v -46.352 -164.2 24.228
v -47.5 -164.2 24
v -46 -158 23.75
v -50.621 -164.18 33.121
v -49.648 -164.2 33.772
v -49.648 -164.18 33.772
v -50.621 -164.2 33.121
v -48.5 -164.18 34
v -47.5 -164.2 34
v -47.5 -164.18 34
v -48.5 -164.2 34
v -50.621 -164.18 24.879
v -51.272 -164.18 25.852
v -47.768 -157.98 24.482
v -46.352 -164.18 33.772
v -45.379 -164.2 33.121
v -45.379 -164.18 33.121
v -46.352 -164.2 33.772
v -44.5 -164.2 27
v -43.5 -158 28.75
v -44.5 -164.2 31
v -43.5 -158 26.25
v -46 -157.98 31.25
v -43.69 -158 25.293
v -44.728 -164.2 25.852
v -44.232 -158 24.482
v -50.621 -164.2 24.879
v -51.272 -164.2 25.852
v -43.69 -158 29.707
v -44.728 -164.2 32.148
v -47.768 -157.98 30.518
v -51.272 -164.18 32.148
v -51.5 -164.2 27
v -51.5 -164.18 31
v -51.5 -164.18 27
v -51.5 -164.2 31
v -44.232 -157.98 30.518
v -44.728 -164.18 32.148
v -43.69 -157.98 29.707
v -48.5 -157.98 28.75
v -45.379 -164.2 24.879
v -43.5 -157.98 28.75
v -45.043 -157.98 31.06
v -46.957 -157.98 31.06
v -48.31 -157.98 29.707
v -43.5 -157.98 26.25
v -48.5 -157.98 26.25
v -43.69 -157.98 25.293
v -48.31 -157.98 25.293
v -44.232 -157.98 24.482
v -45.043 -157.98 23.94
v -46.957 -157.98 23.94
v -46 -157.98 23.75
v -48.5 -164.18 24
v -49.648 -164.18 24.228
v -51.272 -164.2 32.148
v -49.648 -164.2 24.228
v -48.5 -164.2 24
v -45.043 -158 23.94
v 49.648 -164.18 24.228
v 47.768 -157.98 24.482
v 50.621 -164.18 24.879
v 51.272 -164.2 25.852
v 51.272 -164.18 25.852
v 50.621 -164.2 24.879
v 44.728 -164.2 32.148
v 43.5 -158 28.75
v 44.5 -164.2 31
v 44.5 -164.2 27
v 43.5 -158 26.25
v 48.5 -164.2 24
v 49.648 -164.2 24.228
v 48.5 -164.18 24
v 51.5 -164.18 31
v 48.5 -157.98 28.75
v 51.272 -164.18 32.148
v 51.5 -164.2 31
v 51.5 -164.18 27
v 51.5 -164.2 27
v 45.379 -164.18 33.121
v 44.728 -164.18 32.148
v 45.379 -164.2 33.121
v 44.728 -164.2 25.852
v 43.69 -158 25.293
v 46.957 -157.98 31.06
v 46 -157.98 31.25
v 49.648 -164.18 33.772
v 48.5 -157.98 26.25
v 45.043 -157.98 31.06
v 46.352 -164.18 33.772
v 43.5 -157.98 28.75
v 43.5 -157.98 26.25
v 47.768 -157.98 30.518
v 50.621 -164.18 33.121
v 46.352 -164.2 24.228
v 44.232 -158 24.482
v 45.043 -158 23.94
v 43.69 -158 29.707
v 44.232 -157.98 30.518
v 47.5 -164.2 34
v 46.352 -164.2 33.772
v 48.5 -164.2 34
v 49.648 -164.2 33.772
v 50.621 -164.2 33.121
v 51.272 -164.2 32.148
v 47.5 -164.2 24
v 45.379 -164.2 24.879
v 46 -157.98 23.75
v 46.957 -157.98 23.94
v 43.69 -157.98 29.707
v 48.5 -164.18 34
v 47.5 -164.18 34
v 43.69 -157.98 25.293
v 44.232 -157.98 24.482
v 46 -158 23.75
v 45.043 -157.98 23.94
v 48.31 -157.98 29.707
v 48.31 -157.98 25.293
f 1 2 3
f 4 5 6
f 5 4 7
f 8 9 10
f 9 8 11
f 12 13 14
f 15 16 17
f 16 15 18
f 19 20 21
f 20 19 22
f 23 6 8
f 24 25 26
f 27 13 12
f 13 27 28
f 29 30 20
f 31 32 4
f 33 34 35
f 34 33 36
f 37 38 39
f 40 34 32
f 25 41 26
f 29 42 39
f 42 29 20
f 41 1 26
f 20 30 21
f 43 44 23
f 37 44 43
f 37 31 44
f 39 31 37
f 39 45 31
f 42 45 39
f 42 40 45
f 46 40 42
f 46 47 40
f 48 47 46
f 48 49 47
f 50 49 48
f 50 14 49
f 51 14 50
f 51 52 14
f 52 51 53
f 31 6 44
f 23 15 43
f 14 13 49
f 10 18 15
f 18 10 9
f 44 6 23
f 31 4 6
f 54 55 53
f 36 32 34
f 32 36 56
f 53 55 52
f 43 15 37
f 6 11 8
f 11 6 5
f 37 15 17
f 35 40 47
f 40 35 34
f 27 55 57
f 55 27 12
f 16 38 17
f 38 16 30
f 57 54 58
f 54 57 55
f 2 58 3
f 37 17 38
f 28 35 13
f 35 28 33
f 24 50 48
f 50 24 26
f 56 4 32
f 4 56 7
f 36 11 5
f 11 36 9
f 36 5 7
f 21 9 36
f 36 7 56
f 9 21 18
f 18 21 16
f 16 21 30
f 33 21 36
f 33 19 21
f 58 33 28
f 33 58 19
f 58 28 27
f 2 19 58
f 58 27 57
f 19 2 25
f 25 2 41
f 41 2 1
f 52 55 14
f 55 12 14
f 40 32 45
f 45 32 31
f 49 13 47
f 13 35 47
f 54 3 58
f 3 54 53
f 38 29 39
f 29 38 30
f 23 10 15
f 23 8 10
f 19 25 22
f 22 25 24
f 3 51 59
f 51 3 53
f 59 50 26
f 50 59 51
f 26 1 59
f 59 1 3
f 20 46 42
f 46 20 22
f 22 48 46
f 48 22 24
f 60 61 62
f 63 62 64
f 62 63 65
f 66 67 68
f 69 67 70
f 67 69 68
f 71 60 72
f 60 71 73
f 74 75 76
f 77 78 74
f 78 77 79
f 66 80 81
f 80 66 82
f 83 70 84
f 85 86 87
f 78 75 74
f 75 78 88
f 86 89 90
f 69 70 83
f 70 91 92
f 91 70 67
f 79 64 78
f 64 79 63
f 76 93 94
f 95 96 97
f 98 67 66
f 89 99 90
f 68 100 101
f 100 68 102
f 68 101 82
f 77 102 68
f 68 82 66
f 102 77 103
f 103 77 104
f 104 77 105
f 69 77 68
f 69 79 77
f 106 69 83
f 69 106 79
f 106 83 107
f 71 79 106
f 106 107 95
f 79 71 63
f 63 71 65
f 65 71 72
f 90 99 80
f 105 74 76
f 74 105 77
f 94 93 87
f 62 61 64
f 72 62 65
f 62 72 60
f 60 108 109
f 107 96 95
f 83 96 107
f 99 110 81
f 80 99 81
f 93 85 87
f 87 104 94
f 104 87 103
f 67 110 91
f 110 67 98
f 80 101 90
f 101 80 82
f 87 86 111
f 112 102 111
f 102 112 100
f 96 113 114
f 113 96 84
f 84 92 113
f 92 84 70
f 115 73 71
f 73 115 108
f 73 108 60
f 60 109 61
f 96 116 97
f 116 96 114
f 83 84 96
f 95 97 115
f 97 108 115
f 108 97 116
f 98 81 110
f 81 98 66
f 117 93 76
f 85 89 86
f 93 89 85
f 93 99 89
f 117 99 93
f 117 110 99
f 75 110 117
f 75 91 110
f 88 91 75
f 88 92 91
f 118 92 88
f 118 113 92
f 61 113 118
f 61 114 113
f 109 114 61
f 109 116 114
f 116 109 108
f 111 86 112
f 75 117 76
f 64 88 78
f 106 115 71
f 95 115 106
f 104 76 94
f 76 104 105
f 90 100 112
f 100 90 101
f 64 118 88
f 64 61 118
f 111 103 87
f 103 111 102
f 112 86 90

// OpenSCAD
// file: ../lib.scad
// ===== 공용 프리미티브 (params 의존 없음 — use로 포함. 함정 1) =====

// 두 점을 잇는 캡슐. 끝단이 od/2 만큼 뻗는다 (함정 3)
module rod(p1, p2, od, fn = 56)
    hull() { translate(p1) sphere(d = od, $fn = fn);
             translate(p2) sphere(d = od, $fn = fn); }

function mir(p, s = 1) = [s * p.x, p.y, p.z];

// --- 라운디드 사각 2D 폴리곤 (CCW) ---
function arc_pt(cx, cy, r, a) = [cx + r * cos(a), cy + r * sin(a)];
function rrpts(w, h, r, n = 4) =
    let (x = w / 2 - r, y = h / 2 - r)
    concat(
        [for (i = [0:n]) arc_pt( x, -y, r, -90 + 90 * i / n)],
        [for (i = [0:n]) arc_pt( x,  y, r,   0 + 90 * i / n)],
        [for (i = [0:n]) arc_pt(-x,  y, r,  90 + 90 * i / n)],
        [for (i = [0:n]) arc_pt(-x, -y, r, 180 + 90 * i / n)]);

// y 위치의 XZ 단면 슬래브 (중심 x0/zc, 폭 w/높이 h, 모서리 r).
// 회전 매핑: 2D x→차량 X, 2D y→차량 Z, 돌출 +z→−Y (y..y+0.02 전방 전용, 함정 20)
module slabr(y, x0, w, h, zc, r)
    translate([x0, y + 0.02, zc]) rotate([90, 0, 0])
        linear_extrude(0.02) polygon(rrpts(w, h, r));

// 단면 체인 loft: sec = [[y, x0, w, h, zc, r], ...]
module loftr(sec)
    for (i = [0 : len(sec) - 2])
        hull() {
            slabr(sec[i][0],     sec[i][1],     sec[i][2],     sec[i][3],     sec[i][4],     sec[i][5]);
            slabr(sec[i + 1][0], sec[i + 1][1], sec[i + 1][2], sec[i + 1][3], sec[i + 1][4], sec[i + 1][5]);
        }

// 라운디드 박스 (z0..z1 수직, 평면 모서리 r)
module rbox(xc, yc, z0, z1, dx, dy, r, fn = 32)
    hull() for (px = [-1, 1], py = [-1, 1])
        translate([xc + px * (dx / 2 - r), yc + py * (dy / 2 - r), z0])
            cylinder(r = r, h = z1 - z0, $fn = fn);

// --- NACA 계열 에어포일 (LE 원점, 2D +x = 현 방향) ---
function _yt(x, c, t) = 5 * t * c * (0.2969*sqrt(x) - 0.1260*x - 0.3516*x*x
    + 0.2843*x*x*x - 0.1036*x*x*x*x);
function _yc(x, c, m) = 4 * m * c * x * (1 - x);
function naca_pts(c, t, m, n = 12) =
    concat(
        [for (i = [0:n])     let (x = i / n)     [x*c,  _yt(x, c, t) + _yc(x, c, m)]],
        [for (i = [n-1:-1:0]) let (x = i / n)    [x*c, -_yt(x, c, t) + _yc(x, c, m)]]);

// 슬라이스 3D 링: v=[x, yle, zle, c, aoa, th, cam] → 받각 회전된 naca 점의 링
// (th/cam은 mm — 현 대비 비율로 정규화)
function wring(v, n = 12) =
    let (c = v[3], t = v[5] / c, m = v[6] / c, pts = naca_pts(c, t, m, n),
         ca = cos(v[4]), sa = sin(v[4]))
    // 코드 방향 (ca,sa) + 두께/캠버 수직 방향 (-sa,ca) — 2D y 누락 금지
    [for (p = pts) [v[0], v[1] + p[0] * ca - p[1] * sa, v[2] + p[0] * sa + p[1] * ca]];

// 진짜 로프트 윙 — polyhedron 스트립. hull 체인은 캠버진 하면을 볼록 껍질로
// 채워(LE→TE 직선 웨지) 요소가 처지므로 쓰지 않는다
module wing3(sl, n = 12) {
    rings = [for (v = sl) wring(v, n)];
    ns = len(rings);
    m = len(rings[0]);
    pts = [for (r = rings, p = r) p];
    function ix(i, k) = i * m + (k % m);
    faces = concat(
        // 측면 스트립 (사중면 → 삼각형 2) — 외향 노멀 권선(캡과 일치)
        [for (i = [0 : ns - 2], k = [0 : m - 1])
            each [[ix(i, k), ix(i, k + 1), ix(i + 1, k + 1)],
                  [ix(i, k), ix(i + 1, k + 1), ix(i + 1, k)]]],
        // 끝 캡 (링은 단순 폴리곤 — 팬 삼각분할)
        [for (k = [1 : m - 2]) [ix(0, 0), ix(0, k + 1), ix(0, k)]],
        [for (k = [1 : m - 2]) [ix(ns - 1, 0), ix(ns - 1, k), ix(ns - 1, k + 1)]]
    );
    polyhedron(points = pts, faces = faces, convexity = 4);
}

// 반쪽 슬라이스 → x-대칭 전체. 규약: half는 센터(x=0)→팁 순서(내림차순 x).
// 결과는 x 오름차순 체인. x=0 센터만 중복 제외 (그 외 전부 미러)
function wsym(half) =
    concat([for (i = [len(half) - 1 : -1 : 0]) half[i]],
           [for (i = [0 : len(half) - 1]) if (abs(half[i][0]) > 1e-9)
               concat([-half[i][0]], [for (j = [1 : len(half[i]) - 1]) half[i][j]])]);

// 환(링), 축 Z
module ann(r_in, r_out, h, fn = 96)
    difference() { cylinder(r = r_out, h = h, center = true, $fn = fn);
                   cylinder(r = r_in,  h = h + 2, center = true, $fn = fn); }

// 리스트 전체 x반전+순서 역행 (센터 구간 없는 플랩 등 — 좌우 별도 wing3 호출용).
// x반전만 하면 행렬식이 음수가 되어 권선이 뒤집힌다 → 순서 역행으로 상쇄
function msym(half) =
    [for (i = [len(half) - 1 : -1 : 0])
        concat([-half[i][0]], [for (j = [1 : len(half[i]) - 1]) half[i][j]])];
// file: ../params.scad
// =====================================================================
// F1 그랜드파이언스 카 1:10 — 전체 파라미터 (유일한 수정 지점)
// 좌표계: +Y 전방, +X 좌측, +Z 상방, 지면 z=0, 원점=휠베이스 중심
// 전장 558 (y -268..+278), 전폭 194, 휠베이스 360, 타이어 OD 72 (720mm)
// 30부품. loftr 단면 = [y, x0, w, h, zc, r] (XZ 단면, y..y+0.02 슬래브)
// wing3 슬라이스 = [x, yle, zle, c, aoa, th, cam]
//   aoa: 현 방향의 X축 회전각. 전방 받각 요소는 165~170 (TE가 뒤+위)
// =====================================================================
$fn = 96;

// -- 휠/액슬 (실차 720mm 타이어, 18인치 림, 트랙 F1600/R1550) --
AXF_Y = 180;   AXR_Y = -180;
WHF_X = 80;    WHR_X = 77.5;
WH_Z  = 36;
TIRF_W = 30.5; TIRR_W = 40.5;  TIR_R = 36;
TIR_FN = 288;                 // 타이어 회전체 해상도
RIM_R = 23.2;  RIM_T = 1.0;   // 림 배럴 반경/두께
RIM_LF = 12.4; RIM_LR = 17.4; // 림 배럴 반폭
HUB_BORE = 7.0; STUB_D = 6.2; // 방사 간극 0.4
DISC_R = 15.5;                // 브레이크 디스크

// -- 바디 공통 레벨 --
FLO_Z0 = 2.0;  FLO_Z1 = 5.5;  // 플로어 (두께 3.5)
BOD_Z0 = 5.65;                // 샤시/카버/기어박스 바닥 (플로어 위 0.15)
J = 0.15;                     // 부품 접합 기본 간극
ARM_OD = 3.4;                 // 서스펜션 암 캡슐 직경

// ===== 01 플로어 =====
FLOOR_SEC = [
    [132,    0,  92, 3.5, 3.75, 1.5], [100, 0, 118, 3.5, 3.75, 1.5],
    [60,     0, 130, 3.5, 3.75, 2.0], [10,  0, 132, 3.5, 3.75, 2.0],
    [-60,    0, 128, 3.5, 3.75, 2.0], [-120, 0, 112, 3.5, 3.75, 2.0],
    [-161.85, 0, 100, 3.5, 3.75, 2.0]];

// ===== 02 디퓨저 (램프 + 스트레이크는 부품 내부) =====
DIFF_SEC = [
    [-230,   0, 100, 10.0, 11.0, 1.5], [-215, 0, 100, 8.0,  9.0, 1.5],
    [-190,   0, 100,  6.0,  6.2, 1.5], [-162.0, 0, 100, 4.0, 4.15, 1.5]];
DIFF_TOP = [[-175, 7.8], [-205, 11.9], [-228, 15.6]];  // (y, 램프 상면 z)

// ===== 03 플로어 에지 윙 =====
FEW_SEC = [   // [y, x0, w, h, zc, r] — x0 부호로 좌우
    [55,   63.5, 3.0, 2.0, 6.65, 1.0], [-5,  65.5, 3.0, 5.5, 8.40, 1.5],
    [-70,  63.0, 3.0, 4.0, 7.65, 1.5], [-120, 58.0, 3.0, 3.0, 7.15, 1.5]];
FEW2_SEC = [
    [100, 57.0, 2.5, 1.5, 6.40, 0.8], [60, 60.0, 2.5, 2.0, 6.65, 0.8]];

// ===== 04 노우즈 =====
NOSE_SEC = [
    [95,   0, 38, 28, 25.3, 12], [100,  0, 38, 29, 25.3, 12],
    [115,  0, 36, 28, 23.8, 11], [135,  0, 31, 24, 21.3,  9],
    [160,  0, 27, 20, 18.3,  8], [185,  0, 23, 17, 15.8,  7],
    [205,  0, 20, 15, 14.3,  6], [224,  0, 17, 12, 12.3,  5],
    [242,  0, 14,  9, 10.8,  4], [258,  0, 10,  7, 10.1,  3],
    [272,  0,  4.5, 4.5, 9.8, 2], [273.5, 0, 1.2, 1.2, 9.8, 0.6]];

// ===== 05 샤시(모노코크) + 콕핏 컷 =====
CHAS_SEC = [
    [-34.85, 0, 46, 44, 27.65, 15], [-10, 0, 48, 46, 28.65, 15],
    [20,     0, 48, 44, 27.65, 15], [60,  0, 46, 40, 25.65, 14],
    [94.85,  0, 42, 34, 22.65, 12]];
CKP_CUT = [[62, 0, 34, 32, 46, 3], [-30, 0, 34, 30, 45, 3]];

// ===== 06 엔진 커버 + 샤크핀 =====
COV_SEC = [
    [-152,   0,  8, 14, 35.65,  6], [-140, 0, 12, 18, 32.65,  7],
    [-120,   0, 18, 24, 29.65,  9], [-95,  0, 26, 30, 26.15, 11],
    [-70,    0, 34, 36, 25.65, 13], [-50,  0, 40, 40, 25.65, 14],
    [-35.15, 0, 44, 42, 26.65, 15]];
FIN_SEC = [
    [-162, 0, 2.2, 44, 62.0, 1], [-120, 0, 2.5, 30, 56.0, 1],
    [-92.2, 0, 2.5, 10, 45.0, 1]];

// ===== 07 에어박스 (험프 + 인테이크 링) =====
ABX_SEC = [
    [-92, 0, 14, 17, 50.00, 6], [-68, 0, 20, 24, 56.60, 8],
    [-46, 0, 22, 26, 59.60, 8], [-34, 0, 22, 13, 56.30, 6]];
ABX_RING_C = [0, -45, 73.5];  ABX_RING_R = 11;  ABX_RING_T = 4.5;
ABX_RING_SZ = 0.72;

// ===== 08 사이드포드 (x0=±41.5) =====
SPOD_X0 = 41.5;
SPOD_SEC = [   // [y, w, h, zc, r]
    [38,   34, 26, 18.65, 8], [5,   34, 28, 19.65, 9], [-25,  34, 26, 18.65, 9],
    [-55,  32, 21, 18.15, 8], [-80, 30, 15, 17.15, 8], [-100, 26,  9, 16.15, 7]];
SPOD_INLET = [24, 18, 19, 2.3];  // 컷: w, h, zc, 깊이

// ===== 09 할로 =====
HALO_N = 28;  HALO_OD = 9;
HALO_RX = 22; HALO_RY = 44; HALO_CY = 12;  // 타원 계획면(평면도)
HALO_Z0 = 75; HALO_ZA = 2;                 // z(t) = Z0 + ZA*cos(t)

// ===== 10/11/12/13 프런트 윙 =====
FW_MAIN_HALF = [   // 반쪽(x≤0) — wsym()로 전체화
    [0,    258.3, 2.4, 20, 170, 1.4, 2.0],
    [-16,  259.0, 3.4, 27, 165, 1.6, 2.4],
    [-40,  260.0, 3.6, 40, 166, 1.8, 2.8],
    [-60,  257.0, 4.0, 37, 167, 1.7, 2.6],
    [-80,  258.0, 4.4, 31, 166, 1.6, 2.2],
    [-95.2, 263.0, 4.6, 26, 166, 1.5, 1.8]];
FW_F1_HALF = [
    [-16,  253.0, 8.0, 22, 155, 1.3, 4.0],
    [-40,  250.5, 8.2, 26, 156, 1.4, 4.2],
    [-60,  249.5, 8.4, 26, 157, 1.4, 4.2],
    [-80,  250.0, 8.6, 24, 158, 1.4, 4.0],
    [-95.2, 254.0, 8.8, 21, 158, 1.3, 3.5]];
FW_F2_HALF = [
    [-16,  258.0, 12.4, 17, 147, 1.2, 4.5],
    [-40,  255.5, 12.6, 20, 148, 1.3, 4.8],
    [-60,  254.5, 12.8, 20, 149, 1.3, 4.8],
    [-80,  254.5, 13.0, 19, 150, 1.3, 4.5],
    [-95.2, 258.0, 13.2, 17, 150, 1.2, 4.0]];
FW_EP_X = 96.3;  FW_EP_T = 1.5;   // 엔드플레이트 x 중심/두께
FW_EP_PTS = [    // (y,z) 아웃라인
    [226, 1.5], [266, 1.5], [266, 8], [263, 24.5], [252, 24.5],
    [244, 17], [233, 15], [226, 9]];
FW_MT_SEC = [   // 마운트 플레이트 [y, x0(±2.6), w, h, zc, r] — 노우즈 저면 라운딩 회피
    [244, 2.6, 1.6, 1.8, 5.25, 0.5], [250, 2.6, 1.6, 1.8, 5.25, 0.5]];

// ===== 14 리어 윙 =====
RW_MAIN = [
    [-50.8, -212, 57.5, 46, 162, 2.2, -3.5], [-25, -211, 56.6, 47, 162, 2.3, -4.0],
    [0,     -210, 54.2, 47, 162, 2.3, -4.0], [25,  -211, 56.6, 47, 162, 2.3, -4.0],
    [50.8,  -212, 57.5, 46, 162, 2.2, -3.5]];
RW_FLAP = [
    [-49.6, -234,   71.8, 30, 155, 1.8, -4.5],
    [0,     -235.5, 73.0, 30, 155, 1.8, -4.5],
    [49.6,  -234,   71.8, 30, 155, 1.8, -4.5]];
RW_EP_X = 52;  RW_EP_T = 2;
RW_EP_PTS = [
    [-200, 46], [-268, 46], [-268, 60], [-262, 93], [-250, 93],
    [-243, 72], [-218, 64], [-202, 74]];
RW_DRS = [-245, 79.4, 5.0, 2.6, 3.0];   // 팟: y, z, w, h, 두께

// ===== 15 빔 윙 =====
BEAM_E1 = [
    [-50.9, -204.5, 31.5, 16, 162, 1.8, -2.5], [0, -205.5, 30.4, 16, 162, 1.8, -2.5],
    [50.9,  -204.5, 31.5, 16, 162, 1.8, -2.5]];
BEAM_E2 = [
    [-50.9, -210, 36.8, 15, 158, 1.6, -3.0], [0, -211, 35.6, 15, 158, 1.6, -3.0],
    [50.9,  -210, 36.8, 15, 158, 1.6, -3.0]];
BEAM_PLATE = [-214, -200.15, 8.2, 22, 31];  // 마운트 플레이트 y1,y0,x반폭,z0,z1

// ===== 16 리어윙 파일론(쌍둥 스완넥) =====
RW_PYL = [[-158, 55.0], [-190, 58.0], [-212.5, 63.0]];  // (y, z), x=±5.4
RW_PYL_X = 5.4;  RW_PYL_OD = 8;

// ===== 17 미러 =====
MIR_BASE = [14, 63, 46.0];  MIR_HOUSE = [31, 66, 56.5];

// ===== 18 헬멧 =====
HELM_C = [0, 0, 55];  HELM_R = 11.5;
HELM_SC = [1, 1.18, 1.02];

// ===== 19 콕핏 트림 =====
SEAT_SEC  = [[30, 0, 26, 13.2, 36.75, 3], [-10, 0, 26, 13.2, 36.75, 3]];
HREST_SEC = [[12, 0, 32, 15, 53.5, 5], [-20, 0, 32, 15, 53.5, 5]];

// ===== 20 스티어링 휠 =====
SW_C = [0, 40, 47];  SW_TILT = 20;

// ===== 21/22 서스펜션 (픽업=[x, y, z], 암 끝은 업라이트 내부) =====
FUP = [61, 183, 46];  FLO_BALL = [61.5, 181, 24];  FTR = [61.5, 177, 35];
FPU = [61.5, 180, 27];
F_ARM = [   // [픽업, 볼]
    [[12.0, 206, 20.0], FUP],  [[16.0, 152, 23.0], FUP],
    [[11.9, 208,  9.3], FLO_BALL], [[16.3, 150, 12.0], FLO_BALL],
    [[15.6, 162, 14.0], FTR]];
F_PUSH = [[11.8, 198, 24.4], FPU];
RUP = [53.5, -182, 46];  RLO = [54, -179, 23];  RDRIVE_O = [52, -180, 31];
R_ARM = [
    [[13.3, -160, 47.0], RUP], [[13.3, -198, 45.0], RUP],
    [[12.8, -158, 20.4], RLO], [[9.2, -202, 19.6], RLO]];
R_PULL = [[12.6, -177, 23.75], [53.5, -181, 44]];
R_DRIVE = [[13.2, -180, 17.0], RDRIVE_O];

// ===== 23/24 브레이크 스쿱 =====
SCOOP_F = [[164.2, 59.5, 7, 11, 30, 3], [158, 58.5, 5.5, 8, 28.5, 2.5]];
SCOOP_R = [[-164.2, 48, 7, 10, 29, 3], [-158, 46, 5, 7.5, 27.5, 2.5]];

// ===== 25~28 타이어/림 =====
TIRE_BEAD = 2.6;   // 비드 안쪽 세팅 (단면 반경 23.4)

// ===== 29 기어박스 + 리어 크래시 =====
GEAR_SEC = [
    [-258,   0,  4,  1.8, 15.00, 1.5], [-252, 0,  6,  1.6, 16.30, 2],
    [-230,   0,  9,  1.4, 18.30, 3],   [-208, 0, 12,  4.9, 15.05, 4],
    [-195,   0, 16,  9.35, 14.83, 5],   [-170, 0, 20, 15.1, 15.45, 6],
    [-145,   0, 22, 15.95, 13.60, 7],  [-117.85, 0, 26, 8.6,  9.95, 8]];
GEAR_TOWER = [-200, -158, 8, 11.3, 28, 50];  // y1,y0,x내측,x외측,z0,z1
RAIN_LT = [-258.6, 5, 4];   // y면, w, h

// ===== 30 카메라/안테나 =====
TCAM_Y = -45;  TCAM_Z0 = 84.8;
SIDECAM = [[194, 19.0], [202, 18.5]];  // (y, z) — x는 노우즈 반폭+0.15
ANT = [[4, 70], [-4, 70]];             // (x, y) — chassis 탑
// main file
// 24 리어 브레이크 스쿱 — 업라이트 후방 흡기구 (좌우 1부품)
include <../params.scad>
use <../lib.scad>

module brake_scoop_rear()
for (s = [-1, 1])
    loftr([for (r = SCOOP_R) [r[0], s * r[1], r[2], r[3], r[4], r[5]]]);

brake_scoop_rear();
